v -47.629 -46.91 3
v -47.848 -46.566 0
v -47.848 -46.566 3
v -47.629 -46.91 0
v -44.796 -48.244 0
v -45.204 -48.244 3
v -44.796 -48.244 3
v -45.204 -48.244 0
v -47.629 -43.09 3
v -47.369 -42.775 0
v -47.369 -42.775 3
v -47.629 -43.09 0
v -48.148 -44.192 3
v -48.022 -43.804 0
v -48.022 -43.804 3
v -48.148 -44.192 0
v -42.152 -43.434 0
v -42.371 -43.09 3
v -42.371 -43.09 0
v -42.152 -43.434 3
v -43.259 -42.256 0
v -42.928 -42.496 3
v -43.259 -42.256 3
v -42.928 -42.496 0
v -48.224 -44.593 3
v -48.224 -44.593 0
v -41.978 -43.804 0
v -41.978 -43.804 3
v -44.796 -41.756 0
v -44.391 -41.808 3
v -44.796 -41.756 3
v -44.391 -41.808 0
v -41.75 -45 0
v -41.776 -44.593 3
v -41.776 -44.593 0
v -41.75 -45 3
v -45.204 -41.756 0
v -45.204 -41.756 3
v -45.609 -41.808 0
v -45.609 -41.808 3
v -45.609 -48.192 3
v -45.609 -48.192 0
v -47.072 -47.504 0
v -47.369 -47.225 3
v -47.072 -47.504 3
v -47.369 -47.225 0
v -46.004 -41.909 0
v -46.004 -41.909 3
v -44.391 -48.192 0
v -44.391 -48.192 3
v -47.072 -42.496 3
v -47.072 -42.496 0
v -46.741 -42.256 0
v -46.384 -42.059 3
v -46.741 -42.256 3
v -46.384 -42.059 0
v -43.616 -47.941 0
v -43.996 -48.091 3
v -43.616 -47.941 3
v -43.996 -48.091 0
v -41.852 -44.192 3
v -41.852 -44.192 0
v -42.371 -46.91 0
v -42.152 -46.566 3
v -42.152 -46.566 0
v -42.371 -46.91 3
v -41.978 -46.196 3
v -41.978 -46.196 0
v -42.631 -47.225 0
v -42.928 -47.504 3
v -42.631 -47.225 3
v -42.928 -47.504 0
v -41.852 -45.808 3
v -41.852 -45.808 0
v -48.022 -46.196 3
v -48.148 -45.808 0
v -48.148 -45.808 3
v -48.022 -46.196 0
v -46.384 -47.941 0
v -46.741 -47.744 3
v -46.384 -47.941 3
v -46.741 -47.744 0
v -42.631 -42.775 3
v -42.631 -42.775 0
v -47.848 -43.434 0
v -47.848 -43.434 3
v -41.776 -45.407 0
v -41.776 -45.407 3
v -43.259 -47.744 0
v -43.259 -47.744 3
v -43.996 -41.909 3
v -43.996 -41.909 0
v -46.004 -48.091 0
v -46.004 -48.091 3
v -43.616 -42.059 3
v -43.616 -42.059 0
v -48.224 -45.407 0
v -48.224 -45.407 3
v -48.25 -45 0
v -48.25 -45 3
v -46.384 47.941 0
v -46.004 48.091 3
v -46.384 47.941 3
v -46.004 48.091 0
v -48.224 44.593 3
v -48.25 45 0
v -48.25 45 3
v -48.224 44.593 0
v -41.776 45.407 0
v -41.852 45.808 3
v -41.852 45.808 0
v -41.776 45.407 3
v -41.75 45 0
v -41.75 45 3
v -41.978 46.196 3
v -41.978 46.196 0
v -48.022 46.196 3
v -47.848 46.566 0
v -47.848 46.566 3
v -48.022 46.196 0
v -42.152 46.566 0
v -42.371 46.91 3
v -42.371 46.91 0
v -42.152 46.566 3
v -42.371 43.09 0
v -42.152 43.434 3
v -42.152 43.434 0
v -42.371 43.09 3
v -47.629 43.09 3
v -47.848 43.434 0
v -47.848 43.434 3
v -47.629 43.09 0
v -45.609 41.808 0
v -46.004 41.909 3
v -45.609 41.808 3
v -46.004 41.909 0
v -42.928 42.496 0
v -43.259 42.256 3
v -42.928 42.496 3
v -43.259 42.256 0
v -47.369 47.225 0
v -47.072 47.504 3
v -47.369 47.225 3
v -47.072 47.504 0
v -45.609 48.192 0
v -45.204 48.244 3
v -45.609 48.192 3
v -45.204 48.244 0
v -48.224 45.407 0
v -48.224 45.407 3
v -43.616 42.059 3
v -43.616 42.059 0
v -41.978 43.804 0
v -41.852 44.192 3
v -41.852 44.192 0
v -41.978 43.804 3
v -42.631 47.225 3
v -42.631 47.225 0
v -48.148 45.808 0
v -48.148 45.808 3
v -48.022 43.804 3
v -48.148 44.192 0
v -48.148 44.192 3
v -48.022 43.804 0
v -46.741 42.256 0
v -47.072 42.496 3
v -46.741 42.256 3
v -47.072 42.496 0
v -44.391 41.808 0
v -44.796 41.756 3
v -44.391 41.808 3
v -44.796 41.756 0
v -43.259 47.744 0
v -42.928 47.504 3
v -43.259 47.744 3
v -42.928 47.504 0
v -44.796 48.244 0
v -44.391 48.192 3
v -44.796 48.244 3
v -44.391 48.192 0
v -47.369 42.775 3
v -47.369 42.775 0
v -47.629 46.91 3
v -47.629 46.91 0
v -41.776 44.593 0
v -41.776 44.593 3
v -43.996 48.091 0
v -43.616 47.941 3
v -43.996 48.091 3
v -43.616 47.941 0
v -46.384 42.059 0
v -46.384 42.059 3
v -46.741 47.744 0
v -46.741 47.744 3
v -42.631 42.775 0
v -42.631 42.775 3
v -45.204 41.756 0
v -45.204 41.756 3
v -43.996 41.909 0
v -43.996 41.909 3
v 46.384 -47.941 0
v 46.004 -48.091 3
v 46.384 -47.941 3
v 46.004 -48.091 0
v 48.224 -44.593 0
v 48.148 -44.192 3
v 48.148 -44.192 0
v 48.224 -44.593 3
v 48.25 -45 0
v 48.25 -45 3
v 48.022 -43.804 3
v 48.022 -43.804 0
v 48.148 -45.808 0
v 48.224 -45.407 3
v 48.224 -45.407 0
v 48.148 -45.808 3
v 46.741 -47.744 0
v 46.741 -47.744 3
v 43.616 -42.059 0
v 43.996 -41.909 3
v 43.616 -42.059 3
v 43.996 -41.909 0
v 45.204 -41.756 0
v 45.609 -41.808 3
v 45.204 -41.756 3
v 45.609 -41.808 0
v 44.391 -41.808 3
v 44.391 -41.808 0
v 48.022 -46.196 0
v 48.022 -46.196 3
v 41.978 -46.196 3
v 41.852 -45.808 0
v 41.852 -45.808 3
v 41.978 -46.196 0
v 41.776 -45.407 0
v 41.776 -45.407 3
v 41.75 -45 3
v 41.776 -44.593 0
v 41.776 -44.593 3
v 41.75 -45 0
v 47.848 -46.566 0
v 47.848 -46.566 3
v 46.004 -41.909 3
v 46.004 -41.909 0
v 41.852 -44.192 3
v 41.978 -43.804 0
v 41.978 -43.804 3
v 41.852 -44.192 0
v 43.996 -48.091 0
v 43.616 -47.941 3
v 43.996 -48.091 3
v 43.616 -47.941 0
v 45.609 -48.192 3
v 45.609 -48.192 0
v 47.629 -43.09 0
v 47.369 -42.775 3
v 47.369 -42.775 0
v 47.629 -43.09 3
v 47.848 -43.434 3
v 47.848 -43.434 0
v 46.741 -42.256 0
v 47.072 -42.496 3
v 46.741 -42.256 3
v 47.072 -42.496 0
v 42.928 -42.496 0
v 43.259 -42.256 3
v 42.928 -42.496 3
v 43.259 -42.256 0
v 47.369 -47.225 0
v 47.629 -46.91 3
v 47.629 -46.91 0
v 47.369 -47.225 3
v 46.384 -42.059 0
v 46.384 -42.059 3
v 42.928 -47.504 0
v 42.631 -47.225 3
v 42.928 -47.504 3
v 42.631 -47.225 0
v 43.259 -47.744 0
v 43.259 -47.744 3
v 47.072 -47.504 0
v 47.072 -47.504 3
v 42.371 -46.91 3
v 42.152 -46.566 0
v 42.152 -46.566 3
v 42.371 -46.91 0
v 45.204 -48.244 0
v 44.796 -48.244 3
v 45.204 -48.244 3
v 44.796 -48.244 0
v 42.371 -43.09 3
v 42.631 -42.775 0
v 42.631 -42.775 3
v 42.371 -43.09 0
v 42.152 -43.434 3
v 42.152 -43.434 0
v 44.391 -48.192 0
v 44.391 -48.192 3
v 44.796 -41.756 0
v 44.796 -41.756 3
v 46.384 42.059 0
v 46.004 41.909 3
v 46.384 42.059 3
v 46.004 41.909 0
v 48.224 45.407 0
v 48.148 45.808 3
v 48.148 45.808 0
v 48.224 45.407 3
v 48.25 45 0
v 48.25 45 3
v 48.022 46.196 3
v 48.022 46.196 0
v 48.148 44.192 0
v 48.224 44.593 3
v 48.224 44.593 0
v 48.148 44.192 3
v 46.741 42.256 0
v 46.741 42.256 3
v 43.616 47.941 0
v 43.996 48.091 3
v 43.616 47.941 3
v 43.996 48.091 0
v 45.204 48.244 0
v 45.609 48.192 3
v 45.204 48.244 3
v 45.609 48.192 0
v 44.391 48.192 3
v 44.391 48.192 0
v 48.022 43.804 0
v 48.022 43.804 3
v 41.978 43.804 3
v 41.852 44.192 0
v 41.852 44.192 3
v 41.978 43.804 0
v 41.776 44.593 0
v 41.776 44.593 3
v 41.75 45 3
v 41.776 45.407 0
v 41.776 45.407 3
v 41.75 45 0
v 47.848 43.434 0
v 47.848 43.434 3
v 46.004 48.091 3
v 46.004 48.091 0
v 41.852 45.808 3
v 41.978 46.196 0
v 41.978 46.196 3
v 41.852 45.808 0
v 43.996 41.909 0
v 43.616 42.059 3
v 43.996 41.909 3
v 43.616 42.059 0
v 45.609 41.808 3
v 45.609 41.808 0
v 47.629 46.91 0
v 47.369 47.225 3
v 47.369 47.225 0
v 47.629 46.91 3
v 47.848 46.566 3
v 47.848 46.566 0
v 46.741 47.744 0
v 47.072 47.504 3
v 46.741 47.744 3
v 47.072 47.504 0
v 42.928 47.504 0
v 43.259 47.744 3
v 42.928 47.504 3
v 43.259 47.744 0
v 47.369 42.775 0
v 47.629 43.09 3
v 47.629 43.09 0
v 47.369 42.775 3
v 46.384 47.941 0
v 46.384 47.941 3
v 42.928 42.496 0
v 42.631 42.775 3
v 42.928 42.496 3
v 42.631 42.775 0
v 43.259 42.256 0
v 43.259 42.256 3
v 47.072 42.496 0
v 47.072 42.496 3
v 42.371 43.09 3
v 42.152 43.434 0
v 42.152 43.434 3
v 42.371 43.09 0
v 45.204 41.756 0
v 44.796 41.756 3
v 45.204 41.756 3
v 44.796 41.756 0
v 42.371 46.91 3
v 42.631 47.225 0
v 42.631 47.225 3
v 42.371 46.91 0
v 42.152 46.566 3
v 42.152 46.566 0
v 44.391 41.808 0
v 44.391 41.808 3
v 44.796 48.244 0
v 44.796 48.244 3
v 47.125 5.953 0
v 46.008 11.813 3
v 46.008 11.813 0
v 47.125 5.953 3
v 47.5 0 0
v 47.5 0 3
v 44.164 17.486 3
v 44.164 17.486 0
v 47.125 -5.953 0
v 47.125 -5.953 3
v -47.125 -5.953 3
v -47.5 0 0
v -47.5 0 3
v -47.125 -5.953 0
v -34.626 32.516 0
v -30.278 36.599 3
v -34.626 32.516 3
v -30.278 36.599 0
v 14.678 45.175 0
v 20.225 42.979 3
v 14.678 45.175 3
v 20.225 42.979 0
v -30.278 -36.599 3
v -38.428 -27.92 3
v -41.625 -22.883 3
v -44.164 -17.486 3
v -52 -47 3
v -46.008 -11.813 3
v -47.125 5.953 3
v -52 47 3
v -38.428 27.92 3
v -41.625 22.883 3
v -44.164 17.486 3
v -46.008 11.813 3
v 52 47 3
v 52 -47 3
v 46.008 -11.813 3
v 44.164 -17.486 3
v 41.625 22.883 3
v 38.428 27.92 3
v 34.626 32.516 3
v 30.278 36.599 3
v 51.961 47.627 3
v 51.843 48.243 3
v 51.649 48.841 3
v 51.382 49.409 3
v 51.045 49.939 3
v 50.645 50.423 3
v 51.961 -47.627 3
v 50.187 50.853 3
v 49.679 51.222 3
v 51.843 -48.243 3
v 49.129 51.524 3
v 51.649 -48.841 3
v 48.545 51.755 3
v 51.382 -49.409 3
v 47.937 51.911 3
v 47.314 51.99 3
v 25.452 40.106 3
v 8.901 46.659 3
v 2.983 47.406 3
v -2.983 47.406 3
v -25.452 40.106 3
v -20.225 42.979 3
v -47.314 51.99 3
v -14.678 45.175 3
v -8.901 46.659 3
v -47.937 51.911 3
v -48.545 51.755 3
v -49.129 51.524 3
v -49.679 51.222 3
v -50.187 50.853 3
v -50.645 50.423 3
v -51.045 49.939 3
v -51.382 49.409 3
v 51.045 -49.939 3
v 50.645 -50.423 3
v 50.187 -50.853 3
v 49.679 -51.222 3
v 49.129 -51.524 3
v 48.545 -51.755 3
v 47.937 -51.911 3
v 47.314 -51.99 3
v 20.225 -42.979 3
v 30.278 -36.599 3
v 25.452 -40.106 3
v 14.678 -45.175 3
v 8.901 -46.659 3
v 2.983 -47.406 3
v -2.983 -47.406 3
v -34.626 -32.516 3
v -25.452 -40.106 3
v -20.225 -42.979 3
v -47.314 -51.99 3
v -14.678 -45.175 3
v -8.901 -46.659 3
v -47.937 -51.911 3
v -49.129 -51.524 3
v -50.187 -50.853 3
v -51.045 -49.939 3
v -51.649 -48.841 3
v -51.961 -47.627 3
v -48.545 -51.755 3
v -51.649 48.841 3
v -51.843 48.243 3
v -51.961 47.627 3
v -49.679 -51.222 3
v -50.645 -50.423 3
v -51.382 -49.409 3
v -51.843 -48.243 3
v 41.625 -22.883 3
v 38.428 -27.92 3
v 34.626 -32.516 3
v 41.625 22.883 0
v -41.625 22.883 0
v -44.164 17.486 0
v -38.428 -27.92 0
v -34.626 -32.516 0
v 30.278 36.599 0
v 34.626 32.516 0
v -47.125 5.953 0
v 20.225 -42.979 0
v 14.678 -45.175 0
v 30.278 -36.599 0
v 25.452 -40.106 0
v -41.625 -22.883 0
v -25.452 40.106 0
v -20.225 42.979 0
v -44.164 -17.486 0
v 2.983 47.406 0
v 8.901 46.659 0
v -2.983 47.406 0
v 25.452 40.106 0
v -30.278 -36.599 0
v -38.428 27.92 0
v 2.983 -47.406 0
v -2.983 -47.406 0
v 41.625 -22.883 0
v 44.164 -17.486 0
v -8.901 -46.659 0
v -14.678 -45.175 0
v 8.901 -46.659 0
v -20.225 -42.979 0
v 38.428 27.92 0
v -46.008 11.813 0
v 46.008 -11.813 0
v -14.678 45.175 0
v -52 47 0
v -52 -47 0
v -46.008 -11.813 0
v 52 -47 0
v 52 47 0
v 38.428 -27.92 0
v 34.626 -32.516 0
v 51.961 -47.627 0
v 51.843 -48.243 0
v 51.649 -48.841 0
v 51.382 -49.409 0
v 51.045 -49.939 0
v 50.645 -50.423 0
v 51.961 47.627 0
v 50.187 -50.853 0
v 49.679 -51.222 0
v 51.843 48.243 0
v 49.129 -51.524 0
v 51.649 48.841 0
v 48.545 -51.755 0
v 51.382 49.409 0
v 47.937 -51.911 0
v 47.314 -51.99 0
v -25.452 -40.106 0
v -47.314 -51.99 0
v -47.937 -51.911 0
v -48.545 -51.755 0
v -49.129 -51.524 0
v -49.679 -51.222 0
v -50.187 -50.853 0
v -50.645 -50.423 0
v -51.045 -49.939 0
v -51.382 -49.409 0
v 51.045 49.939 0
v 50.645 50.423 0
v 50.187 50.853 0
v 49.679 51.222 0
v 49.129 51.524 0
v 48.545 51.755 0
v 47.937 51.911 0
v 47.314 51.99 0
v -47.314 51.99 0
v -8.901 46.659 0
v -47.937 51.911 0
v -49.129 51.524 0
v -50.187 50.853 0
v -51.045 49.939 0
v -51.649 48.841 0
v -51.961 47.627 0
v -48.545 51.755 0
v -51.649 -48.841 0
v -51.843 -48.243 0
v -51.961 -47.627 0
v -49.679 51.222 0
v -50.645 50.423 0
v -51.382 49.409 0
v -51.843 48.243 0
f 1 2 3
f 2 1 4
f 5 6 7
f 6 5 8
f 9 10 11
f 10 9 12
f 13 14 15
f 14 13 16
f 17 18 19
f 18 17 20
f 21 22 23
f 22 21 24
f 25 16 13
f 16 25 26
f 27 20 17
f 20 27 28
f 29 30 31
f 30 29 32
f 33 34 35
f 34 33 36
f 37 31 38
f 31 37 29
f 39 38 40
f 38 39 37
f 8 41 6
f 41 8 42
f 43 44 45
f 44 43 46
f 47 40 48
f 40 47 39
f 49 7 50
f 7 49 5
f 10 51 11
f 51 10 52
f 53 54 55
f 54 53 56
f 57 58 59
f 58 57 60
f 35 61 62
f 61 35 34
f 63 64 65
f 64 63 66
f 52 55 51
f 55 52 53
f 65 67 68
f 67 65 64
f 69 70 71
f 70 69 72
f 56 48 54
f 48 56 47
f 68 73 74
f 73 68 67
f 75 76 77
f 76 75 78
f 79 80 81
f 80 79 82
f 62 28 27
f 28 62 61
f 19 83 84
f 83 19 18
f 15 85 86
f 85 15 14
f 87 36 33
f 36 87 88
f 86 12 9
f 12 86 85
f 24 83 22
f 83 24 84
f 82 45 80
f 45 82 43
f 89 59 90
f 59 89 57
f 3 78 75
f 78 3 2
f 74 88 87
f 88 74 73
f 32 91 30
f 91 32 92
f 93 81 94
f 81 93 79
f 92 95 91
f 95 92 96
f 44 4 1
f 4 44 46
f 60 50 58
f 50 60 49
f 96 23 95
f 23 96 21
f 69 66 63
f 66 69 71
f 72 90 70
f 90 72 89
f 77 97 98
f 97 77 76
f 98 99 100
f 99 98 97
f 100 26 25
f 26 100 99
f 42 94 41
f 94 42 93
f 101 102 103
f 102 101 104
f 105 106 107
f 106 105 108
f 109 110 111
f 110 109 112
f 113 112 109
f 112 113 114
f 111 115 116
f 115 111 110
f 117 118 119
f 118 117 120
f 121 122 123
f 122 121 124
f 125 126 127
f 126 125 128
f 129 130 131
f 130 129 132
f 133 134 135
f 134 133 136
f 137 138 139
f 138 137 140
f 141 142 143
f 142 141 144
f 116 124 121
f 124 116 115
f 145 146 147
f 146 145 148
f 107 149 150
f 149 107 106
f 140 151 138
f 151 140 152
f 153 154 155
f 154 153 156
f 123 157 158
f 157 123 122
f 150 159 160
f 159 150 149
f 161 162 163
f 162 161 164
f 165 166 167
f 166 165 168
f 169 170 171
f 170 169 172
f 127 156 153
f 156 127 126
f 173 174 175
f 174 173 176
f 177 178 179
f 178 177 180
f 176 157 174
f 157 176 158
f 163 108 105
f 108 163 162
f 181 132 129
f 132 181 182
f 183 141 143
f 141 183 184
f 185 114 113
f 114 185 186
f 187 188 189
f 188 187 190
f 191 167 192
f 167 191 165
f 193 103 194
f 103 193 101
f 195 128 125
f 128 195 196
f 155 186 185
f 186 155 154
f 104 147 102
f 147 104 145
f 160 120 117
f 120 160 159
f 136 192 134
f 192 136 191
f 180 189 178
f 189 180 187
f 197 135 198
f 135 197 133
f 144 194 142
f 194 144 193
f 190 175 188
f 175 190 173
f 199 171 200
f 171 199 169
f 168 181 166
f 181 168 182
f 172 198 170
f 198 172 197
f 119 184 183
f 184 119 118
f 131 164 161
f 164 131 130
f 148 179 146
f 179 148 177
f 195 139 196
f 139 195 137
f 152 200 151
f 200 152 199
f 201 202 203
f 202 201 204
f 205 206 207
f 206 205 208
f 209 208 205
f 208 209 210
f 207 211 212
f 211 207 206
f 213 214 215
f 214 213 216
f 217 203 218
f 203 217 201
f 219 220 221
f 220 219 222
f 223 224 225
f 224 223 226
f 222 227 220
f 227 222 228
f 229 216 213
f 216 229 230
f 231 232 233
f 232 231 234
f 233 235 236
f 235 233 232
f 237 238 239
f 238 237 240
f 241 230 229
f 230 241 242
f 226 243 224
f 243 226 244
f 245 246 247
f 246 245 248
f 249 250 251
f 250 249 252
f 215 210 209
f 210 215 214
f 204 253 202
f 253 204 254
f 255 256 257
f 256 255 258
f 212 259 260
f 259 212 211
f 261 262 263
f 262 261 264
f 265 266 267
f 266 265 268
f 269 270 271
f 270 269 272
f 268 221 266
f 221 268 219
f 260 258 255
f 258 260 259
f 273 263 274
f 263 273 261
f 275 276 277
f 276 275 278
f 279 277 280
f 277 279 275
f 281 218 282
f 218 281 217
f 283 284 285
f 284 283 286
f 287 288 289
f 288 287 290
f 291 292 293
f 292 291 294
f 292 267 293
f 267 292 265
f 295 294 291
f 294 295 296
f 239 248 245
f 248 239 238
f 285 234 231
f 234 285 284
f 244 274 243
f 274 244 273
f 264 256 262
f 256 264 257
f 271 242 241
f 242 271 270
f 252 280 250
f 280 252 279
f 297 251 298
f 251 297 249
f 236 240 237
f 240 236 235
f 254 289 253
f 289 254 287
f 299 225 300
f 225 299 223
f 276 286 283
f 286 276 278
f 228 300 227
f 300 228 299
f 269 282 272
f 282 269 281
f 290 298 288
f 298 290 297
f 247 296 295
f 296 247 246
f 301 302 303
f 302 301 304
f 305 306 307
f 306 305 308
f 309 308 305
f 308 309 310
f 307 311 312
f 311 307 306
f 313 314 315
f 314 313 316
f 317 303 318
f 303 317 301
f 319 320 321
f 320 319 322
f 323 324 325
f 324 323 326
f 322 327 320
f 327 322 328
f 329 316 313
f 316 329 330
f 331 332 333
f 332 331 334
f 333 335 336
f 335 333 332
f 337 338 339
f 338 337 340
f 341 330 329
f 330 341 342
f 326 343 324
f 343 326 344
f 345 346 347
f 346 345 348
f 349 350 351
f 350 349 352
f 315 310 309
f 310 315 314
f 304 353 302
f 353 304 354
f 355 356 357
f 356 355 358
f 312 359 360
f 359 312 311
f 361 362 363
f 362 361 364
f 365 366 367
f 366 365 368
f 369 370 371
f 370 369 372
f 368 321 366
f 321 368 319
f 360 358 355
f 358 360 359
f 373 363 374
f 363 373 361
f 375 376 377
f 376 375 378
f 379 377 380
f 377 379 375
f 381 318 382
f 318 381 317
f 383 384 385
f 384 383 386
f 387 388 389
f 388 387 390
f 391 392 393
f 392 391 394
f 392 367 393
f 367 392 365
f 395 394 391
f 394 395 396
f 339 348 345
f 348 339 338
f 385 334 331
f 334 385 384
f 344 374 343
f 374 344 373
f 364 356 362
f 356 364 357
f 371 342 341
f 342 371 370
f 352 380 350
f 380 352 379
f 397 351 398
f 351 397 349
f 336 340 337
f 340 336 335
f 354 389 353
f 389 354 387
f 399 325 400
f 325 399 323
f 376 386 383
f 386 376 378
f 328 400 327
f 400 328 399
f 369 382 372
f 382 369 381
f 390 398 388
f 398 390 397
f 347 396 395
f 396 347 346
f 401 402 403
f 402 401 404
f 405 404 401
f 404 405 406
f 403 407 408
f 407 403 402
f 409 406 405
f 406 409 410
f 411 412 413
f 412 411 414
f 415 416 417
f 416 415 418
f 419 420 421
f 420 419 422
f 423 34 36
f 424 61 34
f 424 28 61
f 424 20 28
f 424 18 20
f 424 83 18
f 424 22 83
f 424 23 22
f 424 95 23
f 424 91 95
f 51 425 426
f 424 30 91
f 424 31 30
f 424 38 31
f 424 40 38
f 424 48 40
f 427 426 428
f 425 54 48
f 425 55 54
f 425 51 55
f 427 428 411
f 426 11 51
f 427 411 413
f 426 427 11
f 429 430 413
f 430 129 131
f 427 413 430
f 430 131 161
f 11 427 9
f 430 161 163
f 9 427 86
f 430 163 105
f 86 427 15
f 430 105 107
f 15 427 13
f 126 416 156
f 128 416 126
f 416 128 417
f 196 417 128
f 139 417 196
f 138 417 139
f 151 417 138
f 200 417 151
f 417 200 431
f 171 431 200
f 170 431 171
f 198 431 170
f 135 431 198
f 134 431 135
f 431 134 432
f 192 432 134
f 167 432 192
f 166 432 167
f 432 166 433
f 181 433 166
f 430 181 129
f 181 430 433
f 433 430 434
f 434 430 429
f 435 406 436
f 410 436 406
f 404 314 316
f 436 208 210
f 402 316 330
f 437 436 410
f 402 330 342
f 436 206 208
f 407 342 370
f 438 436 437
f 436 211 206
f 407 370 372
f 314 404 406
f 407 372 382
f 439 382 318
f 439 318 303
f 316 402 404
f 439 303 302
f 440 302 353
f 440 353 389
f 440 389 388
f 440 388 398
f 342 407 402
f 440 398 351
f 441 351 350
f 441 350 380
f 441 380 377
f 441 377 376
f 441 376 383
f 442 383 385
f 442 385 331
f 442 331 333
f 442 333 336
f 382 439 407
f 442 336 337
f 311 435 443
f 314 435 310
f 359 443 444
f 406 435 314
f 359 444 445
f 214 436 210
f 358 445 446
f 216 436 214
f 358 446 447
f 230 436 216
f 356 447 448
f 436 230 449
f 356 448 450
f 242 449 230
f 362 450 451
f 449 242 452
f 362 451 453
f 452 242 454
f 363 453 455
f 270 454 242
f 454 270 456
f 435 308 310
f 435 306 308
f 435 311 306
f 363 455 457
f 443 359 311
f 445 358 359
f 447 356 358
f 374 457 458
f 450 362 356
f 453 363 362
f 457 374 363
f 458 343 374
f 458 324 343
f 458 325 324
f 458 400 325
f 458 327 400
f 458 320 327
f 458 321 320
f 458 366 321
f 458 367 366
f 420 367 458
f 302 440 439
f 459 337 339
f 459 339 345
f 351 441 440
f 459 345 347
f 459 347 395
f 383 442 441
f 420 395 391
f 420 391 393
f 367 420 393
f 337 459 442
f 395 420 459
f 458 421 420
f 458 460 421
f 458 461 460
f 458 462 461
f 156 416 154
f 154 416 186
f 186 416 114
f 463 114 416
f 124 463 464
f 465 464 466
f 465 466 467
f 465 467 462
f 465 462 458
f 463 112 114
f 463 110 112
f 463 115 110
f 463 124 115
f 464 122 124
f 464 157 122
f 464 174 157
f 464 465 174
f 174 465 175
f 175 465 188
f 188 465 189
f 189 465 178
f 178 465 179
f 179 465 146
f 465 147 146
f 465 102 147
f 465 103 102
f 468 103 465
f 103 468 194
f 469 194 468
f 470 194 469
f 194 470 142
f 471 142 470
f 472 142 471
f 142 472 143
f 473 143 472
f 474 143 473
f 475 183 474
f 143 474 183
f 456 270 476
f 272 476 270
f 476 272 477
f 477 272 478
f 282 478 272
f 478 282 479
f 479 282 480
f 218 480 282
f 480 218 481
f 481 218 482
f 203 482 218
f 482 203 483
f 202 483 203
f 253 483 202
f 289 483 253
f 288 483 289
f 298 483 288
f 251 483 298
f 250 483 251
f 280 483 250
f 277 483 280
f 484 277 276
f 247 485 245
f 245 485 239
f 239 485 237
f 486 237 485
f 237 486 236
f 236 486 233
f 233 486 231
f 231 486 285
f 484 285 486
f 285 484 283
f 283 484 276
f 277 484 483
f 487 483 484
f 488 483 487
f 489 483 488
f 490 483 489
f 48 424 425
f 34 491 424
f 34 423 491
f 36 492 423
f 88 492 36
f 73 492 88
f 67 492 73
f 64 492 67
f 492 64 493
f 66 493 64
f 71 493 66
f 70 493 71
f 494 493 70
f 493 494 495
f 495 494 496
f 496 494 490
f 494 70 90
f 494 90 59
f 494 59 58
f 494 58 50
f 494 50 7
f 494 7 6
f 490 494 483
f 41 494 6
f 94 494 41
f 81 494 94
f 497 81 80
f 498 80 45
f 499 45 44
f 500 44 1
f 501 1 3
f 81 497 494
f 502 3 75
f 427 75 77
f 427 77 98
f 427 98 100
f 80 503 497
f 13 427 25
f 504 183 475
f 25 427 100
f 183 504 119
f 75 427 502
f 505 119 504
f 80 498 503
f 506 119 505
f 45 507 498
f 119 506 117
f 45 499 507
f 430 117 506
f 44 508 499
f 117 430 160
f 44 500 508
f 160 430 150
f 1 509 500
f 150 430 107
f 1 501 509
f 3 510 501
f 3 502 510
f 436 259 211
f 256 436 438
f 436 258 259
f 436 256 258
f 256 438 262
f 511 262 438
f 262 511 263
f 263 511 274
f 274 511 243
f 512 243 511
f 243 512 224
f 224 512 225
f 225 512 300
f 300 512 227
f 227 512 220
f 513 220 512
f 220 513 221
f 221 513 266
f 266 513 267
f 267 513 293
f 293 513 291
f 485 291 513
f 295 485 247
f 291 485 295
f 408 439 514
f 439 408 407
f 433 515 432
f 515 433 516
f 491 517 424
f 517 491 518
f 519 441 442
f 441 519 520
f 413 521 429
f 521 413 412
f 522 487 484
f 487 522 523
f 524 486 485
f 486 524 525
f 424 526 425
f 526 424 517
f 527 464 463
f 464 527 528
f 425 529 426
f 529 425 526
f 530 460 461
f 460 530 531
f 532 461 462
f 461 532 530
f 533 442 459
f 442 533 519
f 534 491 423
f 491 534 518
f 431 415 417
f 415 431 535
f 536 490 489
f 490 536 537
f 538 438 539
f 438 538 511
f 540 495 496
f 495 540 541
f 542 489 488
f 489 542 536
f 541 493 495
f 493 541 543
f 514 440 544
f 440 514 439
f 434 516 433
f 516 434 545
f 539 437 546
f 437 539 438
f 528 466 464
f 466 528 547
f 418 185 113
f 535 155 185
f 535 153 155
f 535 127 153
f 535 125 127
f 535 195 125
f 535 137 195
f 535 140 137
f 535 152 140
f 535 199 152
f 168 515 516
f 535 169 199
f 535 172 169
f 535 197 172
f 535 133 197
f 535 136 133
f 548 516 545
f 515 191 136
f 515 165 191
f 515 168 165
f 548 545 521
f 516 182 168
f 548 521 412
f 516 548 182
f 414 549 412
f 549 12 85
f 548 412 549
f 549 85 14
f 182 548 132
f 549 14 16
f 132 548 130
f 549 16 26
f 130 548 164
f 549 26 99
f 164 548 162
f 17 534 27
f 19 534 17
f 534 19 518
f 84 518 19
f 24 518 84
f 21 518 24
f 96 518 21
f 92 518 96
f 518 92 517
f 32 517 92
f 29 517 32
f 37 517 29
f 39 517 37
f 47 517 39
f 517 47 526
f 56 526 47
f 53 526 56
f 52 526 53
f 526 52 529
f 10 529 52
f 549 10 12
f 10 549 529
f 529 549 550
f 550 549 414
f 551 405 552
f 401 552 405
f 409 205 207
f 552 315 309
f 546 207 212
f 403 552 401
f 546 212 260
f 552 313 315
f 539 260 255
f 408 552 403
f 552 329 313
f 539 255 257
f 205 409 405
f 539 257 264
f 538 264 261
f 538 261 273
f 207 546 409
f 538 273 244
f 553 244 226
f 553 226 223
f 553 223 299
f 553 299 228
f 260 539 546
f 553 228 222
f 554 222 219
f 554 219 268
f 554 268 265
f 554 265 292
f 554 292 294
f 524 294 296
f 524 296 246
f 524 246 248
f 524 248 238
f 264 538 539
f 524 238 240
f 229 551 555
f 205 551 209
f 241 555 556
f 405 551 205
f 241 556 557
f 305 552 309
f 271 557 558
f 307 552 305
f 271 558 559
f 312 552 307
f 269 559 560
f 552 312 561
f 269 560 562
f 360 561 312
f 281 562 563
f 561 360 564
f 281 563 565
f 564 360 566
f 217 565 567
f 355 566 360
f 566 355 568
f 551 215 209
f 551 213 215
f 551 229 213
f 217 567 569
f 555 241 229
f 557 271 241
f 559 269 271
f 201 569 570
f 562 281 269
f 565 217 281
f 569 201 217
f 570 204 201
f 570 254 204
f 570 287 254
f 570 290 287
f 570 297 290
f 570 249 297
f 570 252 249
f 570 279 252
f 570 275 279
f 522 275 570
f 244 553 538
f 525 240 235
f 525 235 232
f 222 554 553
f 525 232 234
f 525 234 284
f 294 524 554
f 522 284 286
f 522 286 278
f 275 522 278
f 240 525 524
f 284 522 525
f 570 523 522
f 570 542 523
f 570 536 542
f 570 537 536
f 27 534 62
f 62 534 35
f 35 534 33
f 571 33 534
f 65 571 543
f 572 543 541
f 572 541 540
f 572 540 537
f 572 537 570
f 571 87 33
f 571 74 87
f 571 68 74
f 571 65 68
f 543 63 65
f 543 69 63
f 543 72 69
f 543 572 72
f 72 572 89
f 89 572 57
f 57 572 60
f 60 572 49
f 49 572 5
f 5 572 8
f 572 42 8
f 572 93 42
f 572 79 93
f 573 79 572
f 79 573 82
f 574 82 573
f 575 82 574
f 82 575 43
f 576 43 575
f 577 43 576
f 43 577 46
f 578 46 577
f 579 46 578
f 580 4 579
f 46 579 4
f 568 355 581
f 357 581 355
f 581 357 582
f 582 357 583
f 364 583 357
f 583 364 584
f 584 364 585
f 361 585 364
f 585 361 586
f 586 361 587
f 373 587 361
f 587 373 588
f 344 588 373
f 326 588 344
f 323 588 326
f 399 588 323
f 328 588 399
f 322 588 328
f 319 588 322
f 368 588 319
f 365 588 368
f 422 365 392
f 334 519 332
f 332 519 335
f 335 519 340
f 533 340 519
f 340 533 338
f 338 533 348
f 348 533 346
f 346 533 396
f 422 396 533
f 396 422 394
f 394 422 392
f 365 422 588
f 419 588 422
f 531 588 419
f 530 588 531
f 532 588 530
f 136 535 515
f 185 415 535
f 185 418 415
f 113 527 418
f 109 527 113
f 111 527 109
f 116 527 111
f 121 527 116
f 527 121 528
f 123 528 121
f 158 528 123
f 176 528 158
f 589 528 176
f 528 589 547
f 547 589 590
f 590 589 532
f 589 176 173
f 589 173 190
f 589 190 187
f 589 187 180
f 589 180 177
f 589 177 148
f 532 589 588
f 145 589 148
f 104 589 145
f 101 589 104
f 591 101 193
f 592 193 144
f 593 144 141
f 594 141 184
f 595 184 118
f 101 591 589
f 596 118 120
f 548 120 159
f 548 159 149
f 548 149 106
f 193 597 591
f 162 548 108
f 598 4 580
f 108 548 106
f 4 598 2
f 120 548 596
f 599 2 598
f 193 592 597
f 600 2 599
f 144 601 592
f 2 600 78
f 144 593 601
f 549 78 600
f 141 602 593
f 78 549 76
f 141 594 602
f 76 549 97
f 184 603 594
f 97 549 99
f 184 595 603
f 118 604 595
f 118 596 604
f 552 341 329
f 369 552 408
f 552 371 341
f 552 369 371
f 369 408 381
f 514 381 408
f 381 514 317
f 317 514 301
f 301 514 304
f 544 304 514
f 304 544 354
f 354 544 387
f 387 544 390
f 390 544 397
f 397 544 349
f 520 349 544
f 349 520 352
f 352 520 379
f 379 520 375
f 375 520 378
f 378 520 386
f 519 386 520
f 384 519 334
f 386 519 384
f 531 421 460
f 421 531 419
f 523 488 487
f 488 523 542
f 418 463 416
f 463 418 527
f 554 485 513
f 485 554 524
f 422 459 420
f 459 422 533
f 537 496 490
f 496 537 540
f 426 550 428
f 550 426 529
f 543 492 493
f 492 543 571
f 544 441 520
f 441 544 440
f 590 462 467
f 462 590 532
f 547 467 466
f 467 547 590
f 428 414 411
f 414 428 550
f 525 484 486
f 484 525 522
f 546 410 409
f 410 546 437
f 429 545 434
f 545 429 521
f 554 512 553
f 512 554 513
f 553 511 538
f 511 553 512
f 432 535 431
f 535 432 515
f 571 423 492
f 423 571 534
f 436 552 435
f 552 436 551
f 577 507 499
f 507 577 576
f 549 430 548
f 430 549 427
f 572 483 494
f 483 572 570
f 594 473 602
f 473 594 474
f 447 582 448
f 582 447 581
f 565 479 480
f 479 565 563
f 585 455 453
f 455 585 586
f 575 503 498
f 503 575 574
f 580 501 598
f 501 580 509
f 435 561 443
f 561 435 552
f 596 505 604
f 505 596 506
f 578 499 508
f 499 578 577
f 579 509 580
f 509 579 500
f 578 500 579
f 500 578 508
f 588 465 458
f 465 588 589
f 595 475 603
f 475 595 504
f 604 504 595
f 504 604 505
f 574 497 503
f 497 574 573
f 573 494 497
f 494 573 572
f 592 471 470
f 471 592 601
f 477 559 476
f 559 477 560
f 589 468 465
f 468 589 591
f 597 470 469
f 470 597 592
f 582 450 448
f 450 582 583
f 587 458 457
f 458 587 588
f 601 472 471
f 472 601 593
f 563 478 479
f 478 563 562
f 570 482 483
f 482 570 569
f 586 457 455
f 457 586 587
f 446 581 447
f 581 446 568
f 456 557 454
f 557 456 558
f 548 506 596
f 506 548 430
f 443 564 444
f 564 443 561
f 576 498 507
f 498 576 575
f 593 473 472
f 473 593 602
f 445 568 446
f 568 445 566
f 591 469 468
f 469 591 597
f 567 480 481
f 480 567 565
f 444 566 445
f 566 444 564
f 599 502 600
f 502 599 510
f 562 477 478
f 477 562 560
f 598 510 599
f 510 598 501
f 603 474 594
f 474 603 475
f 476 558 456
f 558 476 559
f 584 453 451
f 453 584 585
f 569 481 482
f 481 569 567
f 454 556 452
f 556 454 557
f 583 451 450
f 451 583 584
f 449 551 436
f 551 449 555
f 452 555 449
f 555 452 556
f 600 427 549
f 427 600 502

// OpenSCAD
$fn = 50;


difference() {
	union() {
		hull() {
			translate(v = [-47.0000000000, 47.0000000000, 0]) {
				cylinder(h = 3, r = 5);
			}
			translate(v = [47.0000000000, 47.0000000000, 0]) {
				cylinder(h = 3, r = 5);
			}
			translate(v = [-47.0000000000, -47.0000000000, 0]) {
				cylinder(h = 3, r = 5);
			}
			translate(v = [47.0000000000, -47.0000000000, 0]) {
				cylinder(h = 3, r = 5);
			}
		}
	}
	union() {
		#translate(v = [-45.0000000000, -45.0000000000, -100.0000000000]) {
			cylinder(h = 200, r = 3.2500000000);
		}
		#translate(v = [-45.0000000000, 45.0000000000, -100.0000000000]) {
			cylinder(h = 200, r = 3.2500000000);
		}
		#translate(v = [45.0000000000, -45.0000000000, -100.0000000000]) {
			cylinder(h = 200, r = 3.2500000000);
		}
		#translate(v = [45.0000000000, 45.0000000000, -100.0000000000]) {
			cylinder(h = 200, r = 3.2500000000);
		}
		#cylinder(h = 3, r = 47.5000000000);
	}
}
